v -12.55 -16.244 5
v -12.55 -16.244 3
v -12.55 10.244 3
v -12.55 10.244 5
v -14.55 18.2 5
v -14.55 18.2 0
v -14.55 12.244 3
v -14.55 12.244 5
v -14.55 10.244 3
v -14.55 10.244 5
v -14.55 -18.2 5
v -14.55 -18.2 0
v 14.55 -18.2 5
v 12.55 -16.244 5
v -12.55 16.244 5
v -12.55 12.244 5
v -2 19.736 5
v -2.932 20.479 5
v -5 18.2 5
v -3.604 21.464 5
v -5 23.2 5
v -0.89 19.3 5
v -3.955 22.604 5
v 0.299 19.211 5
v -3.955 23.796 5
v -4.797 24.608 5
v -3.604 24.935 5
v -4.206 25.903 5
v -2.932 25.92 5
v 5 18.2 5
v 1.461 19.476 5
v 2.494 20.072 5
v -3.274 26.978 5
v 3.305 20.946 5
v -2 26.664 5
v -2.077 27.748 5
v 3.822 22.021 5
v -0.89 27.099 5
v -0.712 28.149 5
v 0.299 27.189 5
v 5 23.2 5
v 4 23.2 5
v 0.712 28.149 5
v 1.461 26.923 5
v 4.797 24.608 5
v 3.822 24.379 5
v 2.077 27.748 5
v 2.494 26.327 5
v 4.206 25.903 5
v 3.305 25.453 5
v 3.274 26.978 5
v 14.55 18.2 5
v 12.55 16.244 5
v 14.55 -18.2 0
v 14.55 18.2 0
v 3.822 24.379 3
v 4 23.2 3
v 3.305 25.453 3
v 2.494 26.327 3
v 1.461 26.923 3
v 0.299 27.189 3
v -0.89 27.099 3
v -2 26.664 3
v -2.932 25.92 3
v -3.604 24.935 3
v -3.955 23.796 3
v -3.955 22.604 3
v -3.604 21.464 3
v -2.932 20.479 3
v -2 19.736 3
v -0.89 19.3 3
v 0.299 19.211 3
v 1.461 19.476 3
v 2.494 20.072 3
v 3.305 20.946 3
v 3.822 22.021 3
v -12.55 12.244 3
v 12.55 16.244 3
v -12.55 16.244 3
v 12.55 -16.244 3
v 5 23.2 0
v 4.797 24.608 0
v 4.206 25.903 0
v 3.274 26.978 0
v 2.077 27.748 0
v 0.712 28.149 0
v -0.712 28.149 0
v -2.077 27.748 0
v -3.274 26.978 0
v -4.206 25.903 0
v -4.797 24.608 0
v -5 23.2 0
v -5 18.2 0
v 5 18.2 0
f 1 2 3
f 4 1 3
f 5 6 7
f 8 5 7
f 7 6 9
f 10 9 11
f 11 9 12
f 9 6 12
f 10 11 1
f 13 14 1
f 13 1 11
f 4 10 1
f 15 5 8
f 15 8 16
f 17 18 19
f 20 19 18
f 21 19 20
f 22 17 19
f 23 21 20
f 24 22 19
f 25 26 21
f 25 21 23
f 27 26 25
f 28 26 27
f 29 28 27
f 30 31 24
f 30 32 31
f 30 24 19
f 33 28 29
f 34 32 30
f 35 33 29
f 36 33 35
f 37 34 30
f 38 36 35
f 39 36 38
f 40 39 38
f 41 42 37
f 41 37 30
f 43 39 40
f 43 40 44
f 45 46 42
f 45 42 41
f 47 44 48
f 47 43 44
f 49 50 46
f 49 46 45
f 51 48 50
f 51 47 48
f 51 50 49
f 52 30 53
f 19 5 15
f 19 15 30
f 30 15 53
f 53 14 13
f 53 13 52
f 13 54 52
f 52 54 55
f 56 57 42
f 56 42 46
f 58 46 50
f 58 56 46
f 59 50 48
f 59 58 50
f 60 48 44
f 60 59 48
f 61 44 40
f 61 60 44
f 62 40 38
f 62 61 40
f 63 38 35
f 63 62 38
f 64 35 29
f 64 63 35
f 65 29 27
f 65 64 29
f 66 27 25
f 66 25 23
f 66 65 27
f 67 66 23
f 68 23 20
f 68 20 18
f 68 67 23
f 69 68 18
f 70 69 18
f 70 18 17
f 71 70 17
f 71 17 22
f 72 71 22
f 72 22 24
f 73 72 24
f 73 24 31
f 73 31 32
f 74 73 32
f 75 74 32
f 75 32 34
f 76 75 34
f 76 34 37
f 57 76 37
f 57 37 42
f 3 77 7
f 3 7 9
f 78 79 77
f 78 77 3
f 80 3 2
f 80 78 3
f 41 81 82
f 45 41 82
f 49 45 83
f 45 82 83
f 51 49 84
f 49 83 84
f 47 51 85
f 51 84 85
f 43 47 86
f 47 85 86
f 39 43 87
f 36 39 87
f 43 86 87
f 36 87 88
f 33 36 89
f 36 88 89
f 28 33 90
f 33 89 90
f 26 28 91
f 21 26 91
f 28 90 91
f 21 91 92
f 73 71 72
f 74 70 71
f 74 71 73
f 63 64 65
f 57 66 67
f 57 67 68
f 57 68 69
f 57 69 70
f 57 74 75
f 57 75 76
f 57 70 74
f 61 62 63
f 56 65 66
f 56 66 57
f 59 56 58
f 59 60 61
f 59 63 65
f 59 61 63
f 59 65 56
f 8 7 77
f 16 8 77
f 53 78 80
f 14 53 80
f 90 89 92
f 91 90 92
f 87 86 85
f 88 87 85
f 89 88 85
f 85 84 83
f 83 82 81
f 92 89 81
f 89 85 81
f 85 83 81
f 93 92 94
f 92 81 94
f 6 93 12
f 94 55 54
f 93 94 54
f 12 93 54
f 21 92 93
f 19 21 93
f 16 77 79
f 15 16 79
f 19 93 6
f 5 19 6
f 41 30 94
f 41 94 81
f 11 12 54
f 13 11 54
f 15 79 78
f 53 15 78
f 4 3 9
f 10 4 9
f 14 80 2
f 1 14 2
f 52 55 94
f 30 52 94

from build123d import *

# Parameters (mm, degrees)
F1_DEPTH = 3
F0_R     = 4
F2_DEPTH = 5
F3_DEPTH = 2


with BuildPart() as f1:
    # F0 (on Top) → F1 (new body)
    with BuildSketch(Plane.XY):
        Polygon((-12.55, -16.2437940022), (12.55, -16.2437940022), (12.55, 16.2437940022), (-12.55, 16.2437940022), (-12.55, 12.2437940022), (-12.55, 10.2437940022), align=None)
    extrude(amount=F1_DEPTH)



with BuildPart() as f1b:
    # F0 (on Top) → F1, piece 2 (new body)
    with BuildSketch(Plane.XY):
        with Locations((0, 23.1997125853)):
            Circle(F0_R)
    extrude(amount=F1_DEPTH)


with BuildPart() as f1_1:
    add(f1.part)

    add(f1b.part)  # F2 merges F1b
    # F0 (on Top) → F2 (join)
    with BuildSketch(Plane.XY):
        Polygon((12.55, 16.2437940022), (12.55, -16.2437940022), (-12.55, -16.2437940022), (-12.55, 10.2437940022), (-14.55, 10.2437940022), (-14.55, -18.1997125853), (2.482398646, -18.1997125853), (14.55, -18.1997125853), (14.55, 18.1997125853), (5, 18.1997125853), (0, 18.1997125853), (-5, 18.1997125853), (-14.55, 18.1997125853), (-14.55, 12.2437940022), (-12.55, 12.2437940022), (-12.55, 16.2437940022), align=None)
        with BuildLine():
            ThreePointArc((-5, 23.1997125853), (-3.5355339059, 19.6641786794), (0, 18.1997125853))
            ThreePointArc((0, 18.1997125853), (3.5355339059, 19.6641786794), (5, 23.1997125853))
            ThreePointArc((5, 23.1997125853), (0, 28.1997125853), (-5, 23.1997125853))
        make_face()
        with Locations((0, 23.1997125853)):
            Circle(F0_R, mode=Mode.SUBTRACT)
        with BuildLine():
            ThreePointArc((5, 23.1997125853), (3.5355339059, 19.6641786794), (0, 18.1997125853))
            Line((0, 18.1997125853), (5, 18.1997125853))
            Line((5, 18.1997125853), (5, 19.1997125853))
            Line((5, 19.1997125853), (5, 20.1997125853))
            Line((5, 20.1997125853), (5, 23.1997125853))
        make_face()
        with BuildLine():
            Line((-5, 23.1997125853), (-5, 18.1997125853))
            Line((-5, 18.1997125853), (0, 18.1997125853))
            ThreePointArc((0, 18.1997125853), (-3.5355339059, 19.6641786794), (-5, 23.1997125853))
        make_face()
    extrude(amount=F2_DEPTH)

    # F3 (add): a face of the model
    f3_faces = [f1_1.faces().sort_by_distance(p)[0] for p in [
        (-12.55, 11.2437940022, 1.5),
    ]]
    extrude(f3_faces, amount=F3_DEPTH)


solid = f1_1.part
